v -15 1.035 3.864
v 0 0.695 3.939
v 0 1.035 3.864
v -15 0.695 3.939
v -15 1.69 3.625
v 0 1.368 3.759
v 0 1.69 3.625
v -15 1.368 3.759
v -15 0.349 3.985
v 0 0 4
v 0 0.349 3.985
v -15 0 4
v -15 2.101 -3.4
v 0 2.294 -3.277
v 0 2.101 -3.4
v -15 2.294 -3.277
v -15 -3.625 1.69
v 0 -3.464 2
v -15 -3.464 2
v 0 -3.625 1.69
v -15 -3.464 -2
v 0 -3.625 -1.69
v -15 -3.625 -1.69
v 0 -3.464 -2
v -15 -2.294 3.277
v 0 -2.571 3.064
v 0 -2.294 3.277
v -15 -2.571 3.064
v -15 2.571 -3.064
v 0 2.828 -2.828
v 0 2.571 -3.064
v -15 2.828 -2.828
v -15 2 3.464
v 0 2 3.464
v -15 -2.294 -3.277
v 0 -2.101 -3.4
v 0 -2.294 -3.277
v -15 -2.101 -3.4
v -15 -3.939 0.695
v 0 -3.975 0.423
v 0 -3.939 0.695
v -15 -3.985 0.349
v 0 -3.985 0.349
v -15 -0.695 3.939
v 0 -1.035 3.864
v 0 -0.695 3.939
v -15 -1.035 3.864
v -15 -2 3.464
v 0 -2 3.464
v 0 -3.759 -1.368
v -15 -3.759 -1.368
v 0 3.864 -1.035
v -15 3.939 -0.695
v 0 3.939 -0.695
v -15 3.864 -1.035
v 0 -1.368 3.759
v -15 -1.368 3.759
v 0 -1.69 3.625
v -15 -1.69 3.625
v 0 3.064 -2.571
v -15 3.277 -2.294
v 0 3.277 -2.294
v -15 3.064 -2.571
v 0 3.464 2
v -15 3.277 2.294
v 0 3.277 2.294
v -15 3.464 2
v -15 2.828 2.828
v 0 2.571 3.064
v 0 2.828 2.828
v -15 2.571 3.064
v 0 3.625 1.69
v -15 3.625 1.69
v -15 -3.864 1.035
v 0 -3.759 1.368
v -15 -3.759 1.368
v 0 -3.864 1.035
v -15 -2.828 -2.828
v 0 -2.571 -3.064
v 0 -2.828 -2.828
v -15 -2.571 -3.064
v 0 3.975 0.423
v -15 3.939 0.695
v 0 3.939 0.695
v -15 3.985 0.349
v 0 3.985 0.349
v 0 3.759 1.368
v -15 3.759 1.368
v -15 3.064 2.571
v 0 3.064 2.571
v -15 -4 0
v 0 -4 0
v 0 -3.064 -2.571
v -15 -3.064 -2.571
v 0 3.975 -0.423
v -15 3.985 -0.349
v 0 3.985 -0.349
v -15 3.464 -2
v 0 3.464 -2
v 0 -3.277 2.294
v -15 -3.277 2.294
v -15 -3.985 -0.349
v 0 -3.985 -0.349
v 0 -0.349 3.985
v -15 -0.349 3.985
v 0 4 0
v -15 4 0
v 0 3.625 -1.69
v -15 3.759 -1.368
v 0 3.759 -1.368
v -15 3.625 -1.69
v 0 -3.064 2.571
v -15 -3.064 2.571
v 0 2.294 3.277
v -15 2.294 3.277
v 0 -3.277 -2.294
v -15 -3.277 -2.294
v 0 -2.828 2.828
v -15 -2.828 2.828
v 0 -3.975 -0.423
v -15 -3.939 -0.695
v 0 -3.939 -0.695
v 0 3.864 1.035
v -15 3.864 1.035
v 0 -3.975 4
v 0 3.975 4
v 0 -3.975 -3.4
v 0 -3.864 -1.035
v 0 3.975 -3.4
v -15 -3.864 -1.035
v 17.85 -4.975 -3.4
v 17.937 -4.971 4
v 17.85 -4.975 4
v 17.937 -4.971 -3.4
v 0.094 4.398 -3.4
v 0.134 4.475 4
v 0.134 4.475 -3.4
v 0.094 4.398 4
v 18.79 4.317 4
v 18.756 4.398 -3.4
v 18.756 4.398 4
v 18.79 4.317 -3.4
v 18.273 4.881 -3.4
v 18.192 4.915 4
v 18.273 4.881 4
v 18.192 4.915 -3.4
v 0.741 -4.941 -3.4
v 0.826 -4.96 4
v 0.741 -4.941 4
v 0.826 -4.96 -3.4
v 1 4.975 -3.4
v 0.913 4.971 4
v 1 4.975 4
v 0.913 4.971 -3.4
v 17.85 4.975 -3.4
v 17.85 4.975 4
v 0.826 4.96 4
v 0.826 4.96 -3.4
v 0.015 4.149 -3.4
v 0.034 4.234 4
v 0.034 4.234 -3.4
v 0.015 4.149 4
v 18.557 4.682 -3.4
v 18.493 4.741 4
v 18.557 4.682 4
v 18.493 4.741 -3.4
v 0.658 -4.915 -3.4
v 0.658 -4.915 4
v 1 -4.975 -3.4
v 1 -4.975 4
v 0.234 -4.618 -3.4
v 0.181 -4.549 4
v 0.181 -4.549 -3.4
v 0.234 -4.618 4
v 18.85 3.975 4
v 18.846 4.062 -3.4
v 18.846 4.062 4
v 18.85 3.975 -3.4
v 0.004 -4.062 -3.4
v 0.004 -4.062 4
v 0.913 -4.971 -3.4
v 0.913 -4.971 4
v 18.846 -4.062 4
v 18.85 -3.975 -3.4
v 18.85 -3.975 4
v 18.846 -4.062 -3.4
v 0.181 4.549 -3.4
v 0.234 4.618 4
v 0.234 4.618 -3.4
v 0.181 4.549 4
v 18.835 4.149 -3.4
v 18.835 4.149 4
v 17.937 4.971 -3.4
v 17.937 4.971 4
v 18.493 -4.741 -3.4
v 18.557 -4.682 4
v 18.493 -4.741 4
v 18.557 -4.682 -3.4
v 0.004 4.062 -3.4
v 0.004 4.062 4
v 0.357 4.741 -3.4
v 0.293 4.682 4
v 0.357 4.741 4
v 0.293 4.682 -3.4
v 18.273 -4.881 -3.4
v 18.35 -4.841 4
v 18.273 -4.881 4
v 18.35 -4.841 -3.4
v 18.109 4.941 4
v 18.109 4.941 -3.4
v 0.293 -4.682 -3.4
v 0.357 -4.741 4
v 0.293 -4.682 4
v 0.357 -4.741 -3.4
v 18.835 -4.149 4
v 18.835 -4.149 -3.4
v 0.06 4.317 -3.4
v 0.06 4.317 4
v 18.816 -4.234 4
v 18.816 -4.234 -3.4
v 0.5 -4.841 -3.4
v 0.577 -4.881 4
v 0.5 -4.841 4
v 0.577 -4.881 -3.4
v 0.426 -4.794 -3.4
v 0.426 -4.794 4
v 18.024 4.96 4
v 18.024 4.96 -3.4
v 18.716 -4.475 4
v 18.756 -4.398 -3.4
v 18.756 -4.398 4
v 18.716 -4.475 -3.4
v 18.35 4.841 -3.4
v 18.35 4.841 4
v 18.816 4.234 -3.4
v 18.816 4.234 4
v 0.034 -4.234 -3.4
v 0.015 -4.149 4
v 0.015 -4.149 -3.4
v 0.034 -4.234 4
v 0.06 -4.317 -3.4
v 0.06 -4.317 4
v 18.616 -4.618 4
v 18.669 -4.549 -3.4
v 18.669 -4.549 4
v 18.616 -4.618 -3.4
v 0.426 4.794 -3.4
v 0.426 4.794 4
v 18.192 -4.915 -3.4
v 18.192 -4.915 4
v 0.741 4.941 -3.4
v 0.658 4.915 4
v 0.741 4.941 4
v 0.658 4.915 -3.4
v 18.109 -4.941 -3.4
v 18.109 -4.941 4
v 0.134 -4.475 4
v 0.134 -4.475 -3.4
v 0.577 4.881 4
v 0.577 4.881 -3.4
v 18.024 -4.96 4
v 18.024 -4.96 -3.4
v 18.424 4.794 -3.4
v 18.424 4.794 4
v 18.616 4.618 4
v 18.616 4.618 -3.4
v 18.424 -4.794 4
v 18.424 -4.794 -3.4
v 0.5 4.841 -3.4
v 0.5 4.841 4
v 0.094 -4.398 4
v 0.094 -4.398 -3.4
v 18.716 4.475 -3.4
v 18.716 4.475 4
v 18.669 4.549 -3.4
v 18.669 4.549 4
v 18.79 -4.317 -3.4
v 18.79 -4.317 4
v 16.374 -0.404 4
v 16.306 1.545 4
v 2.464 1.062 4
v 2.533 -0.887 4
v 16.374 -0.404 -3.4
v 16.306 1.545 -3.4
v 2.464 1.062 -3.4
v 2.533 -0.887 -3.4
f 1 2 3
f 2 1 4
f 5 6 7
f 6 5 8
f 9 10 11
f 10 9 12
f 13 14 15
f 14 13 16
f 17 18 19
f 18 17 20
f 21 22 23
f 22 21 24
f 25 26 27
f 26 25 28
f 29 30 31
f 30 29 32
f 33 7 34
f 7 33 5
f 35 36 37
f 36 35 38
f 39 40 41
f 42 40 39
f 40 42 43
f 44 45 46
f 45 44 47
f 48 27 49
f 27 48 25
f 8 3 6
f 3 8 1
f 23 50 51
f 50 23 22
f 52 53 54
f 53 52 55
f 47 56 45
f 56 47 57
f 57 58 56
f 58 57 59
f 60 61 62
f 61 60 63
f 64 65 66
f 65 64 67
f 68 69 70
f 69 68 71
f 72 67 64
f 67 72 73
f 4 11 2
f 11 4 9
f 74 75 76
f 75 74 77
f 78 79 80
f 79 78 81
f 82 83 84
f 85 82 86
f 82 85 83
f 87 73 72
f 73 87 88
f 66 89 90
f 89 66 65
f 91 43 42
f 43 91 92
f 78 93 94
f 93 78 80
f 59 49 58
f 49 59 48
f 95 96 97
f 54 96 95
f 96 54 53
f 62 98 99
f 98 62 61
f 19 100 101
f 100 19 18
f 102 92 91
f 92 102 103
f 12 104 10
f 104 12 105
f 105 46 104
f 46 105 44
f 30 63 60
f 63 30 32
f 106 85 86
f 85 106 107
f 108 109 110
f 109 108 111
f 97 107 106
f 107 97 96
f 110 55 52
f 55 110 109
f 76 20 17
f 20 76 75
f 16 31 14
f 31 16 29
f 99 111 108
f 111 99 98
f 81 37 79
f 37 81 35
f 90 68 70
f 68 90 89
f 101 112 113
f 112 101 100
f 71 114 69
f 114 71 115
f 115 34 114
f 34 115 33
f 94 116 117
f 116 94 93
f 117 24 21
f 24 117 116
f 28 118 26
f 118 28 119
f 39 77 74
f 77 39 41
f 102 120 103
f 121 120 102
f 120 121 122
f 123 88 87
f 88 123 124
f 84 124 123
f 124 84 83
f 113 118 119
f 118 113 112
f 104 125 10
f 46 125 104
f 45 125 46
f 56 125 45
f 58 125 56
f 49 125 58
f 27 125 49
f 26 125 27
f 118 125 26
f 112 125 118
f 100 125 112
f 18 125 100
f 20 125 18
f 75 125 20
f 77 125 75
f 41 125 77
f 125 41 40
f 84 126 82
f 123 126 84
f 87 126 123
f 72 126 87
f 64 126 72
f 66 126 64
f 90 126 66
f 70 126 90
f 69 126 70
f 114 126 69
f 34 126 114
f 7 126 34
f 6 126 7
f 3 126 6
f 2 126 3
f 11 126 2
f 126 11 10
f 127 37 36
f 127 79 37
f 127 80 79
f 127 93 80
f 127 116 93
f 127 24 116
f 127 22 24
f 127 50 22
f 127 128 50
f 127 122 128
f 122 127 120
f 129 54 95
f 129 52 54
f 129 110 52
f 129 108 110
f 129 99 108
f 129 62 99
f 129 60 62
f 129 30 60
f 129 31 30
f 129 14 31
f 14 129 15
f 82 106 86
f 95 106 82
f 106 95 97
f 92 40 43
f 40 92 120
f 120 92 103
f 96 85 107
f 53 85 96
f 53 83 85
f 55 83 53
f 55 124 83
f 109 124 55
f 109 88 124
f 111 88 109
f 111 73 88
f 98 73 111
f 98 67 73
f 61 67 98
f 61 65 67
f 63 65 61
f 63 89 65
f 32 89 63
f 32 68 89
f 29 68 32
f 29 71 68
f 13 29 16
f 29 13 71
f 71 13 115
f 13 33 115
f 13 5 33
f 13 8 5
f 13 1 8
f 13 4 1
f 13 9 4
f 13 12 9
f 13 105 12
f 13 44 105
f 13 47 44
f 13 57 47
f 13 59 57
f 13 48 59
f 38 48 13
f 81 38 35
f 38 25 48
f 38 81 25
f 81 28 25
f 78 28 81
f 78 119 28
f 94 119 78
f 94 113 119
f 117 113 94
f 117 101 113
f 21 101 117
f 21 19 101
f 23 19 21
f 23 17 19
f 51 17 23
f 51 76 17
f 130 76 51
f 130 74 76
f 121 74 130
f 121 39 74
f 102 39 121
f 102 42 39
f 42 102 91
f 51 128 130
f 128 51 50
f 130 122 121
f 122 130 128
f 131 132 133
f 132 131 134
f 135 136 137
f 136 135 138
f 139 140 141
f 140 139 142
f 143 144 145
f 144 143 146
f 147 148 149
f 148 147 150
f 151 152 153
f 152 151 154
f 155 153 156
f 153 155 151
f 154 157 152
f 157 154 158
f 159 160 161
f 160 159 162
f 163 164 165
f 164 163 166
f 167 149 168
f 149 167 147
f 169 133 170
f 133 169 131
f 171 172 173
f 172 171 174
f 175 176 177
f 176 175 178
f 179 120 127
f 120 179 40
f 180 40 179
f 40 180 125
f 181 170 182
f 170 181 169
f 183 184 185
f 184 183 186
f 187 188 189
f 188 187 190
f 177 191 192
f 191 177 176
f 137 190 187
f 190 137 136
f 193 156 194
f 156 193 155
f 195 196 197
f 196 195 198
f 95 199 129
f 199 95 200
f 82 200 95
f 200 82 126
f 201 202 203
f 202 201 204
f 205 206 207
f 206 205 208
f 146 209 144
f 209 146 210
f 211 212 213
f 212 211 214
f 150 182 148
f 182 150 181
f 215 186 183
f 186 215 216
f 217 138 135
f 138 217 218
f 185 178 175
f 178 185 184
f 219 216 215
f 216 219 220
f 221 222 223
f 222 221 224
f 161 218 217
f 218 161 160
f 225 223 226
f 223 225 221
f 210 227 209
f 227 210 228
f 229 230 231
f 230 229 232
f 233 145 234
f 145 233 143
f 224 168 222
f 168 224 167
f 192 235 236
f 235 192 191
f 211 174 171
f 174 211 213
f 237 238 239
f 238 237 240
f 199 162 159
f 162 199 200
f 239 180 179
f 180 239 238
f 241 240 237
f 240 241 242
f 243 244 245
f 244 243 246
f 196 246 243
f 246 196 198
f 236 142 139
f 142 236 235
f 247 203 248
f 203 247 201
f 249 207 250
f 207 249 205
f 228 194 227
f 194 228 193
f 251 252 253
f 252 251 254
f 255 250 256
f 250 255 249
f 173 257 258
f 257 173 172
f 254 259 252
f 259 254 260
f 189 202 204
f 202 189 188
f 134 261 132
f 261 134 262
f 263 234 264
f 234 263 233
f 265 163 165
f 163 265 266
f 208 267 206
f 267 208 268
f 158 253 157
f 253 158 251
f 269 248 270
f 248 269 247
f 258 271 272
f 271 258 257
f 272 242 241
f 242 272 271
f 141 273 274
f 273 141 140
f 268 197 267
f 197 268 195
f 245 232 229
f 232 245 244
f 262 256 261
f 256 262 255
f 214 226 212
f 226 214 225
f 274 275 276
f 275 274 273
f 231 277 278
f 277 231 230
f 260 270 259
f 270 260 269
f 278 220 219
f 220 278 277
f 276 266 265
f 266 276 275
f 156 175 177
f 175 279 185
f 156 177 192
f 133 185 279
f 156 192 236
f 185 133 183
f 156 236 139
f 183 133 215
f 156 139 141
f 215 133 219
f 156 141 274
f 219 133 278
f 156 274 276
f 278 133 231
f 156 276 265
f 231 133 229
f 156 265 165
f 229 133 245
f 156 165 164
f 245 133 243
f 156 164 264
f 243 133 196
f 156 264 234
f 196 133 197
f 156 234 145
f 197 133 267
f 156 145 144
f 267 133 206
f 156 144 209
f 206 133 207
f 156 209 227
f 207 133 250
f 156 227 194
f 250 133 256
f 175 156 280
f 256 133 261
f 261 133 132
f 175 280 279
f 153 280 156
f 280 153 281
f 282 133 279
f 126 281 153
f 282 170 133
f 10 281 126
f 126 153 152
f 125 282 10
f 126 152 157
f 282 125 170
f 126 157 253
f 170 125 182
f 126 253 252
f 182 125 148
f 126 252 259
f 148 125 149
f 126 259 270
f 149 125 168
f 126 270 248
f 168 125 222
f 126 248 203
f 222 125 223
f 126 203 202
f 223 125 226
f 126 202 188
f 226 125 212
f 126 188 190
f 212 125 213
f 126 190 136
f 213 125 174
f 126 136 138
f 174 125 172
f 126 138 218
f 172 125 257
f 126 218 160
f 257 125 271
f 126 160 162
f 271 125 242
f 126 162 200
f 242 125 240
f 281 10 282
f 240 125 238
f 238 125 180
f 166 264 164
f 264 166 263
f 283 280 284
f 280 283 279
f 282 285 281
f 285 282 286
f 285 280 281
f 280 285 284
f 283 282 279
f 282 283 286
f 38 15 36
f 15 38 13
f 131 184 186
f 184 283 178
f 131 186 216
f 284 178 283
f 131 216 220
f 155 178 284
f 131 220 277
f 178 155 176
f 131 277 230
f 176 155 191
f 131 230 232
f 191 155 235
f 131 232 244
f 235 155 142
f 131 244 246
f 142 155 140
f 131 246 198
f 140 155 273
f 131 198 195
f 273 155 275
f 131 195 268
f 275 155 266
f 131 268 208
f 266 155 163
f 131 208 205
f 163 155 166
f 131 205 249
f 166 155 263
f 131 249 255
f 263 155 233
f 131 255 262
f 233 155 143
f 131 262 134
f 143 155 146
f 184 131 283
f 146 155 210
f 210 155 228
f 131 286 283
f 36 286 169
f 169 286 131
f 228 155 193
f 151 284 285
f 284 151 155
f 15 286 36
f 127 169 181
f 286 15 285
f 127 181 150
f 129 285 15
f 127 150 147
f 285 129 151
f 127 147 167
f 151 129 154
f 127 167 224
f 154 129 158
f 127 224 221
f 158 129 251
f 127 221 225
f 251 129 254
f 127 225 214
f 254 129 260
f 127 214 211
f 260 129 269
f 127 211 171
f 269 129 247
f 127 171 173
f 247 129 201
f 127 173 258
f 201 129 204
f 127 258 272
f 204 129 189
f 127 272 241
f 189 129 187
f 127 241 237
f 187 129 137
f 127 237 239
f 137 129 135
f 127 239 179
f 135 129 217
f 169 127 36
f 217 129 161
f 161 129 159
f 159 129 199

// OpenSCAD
Gap = 0.2;
$fn = 72;

BarMount();

module BarMount() {
    RodThickness = 1.75 + Gap;
    RodDepth = 13.85; // Measured 13.10, but let's keep it a bit wider
    
    BearingDiameter = 8.0;
    BearingLength = 15;
    
    ConnectorShift = 0.3;
    
    ConnectorWidth = RodThickness+8;
    ConnectorDepth = RodDepth+5;
    
    CornerRadius = 1;
    
    intersection() {
        translate([0,0,ConnectorShift])
            cube([200,200,BearingDiameter - 2 * ConnectorShift], center=true);
        difference() {
            union () {
                rotate([0,-90,0])
                    cylinder(r = BearingDiameter/2, h = BearingLength);
                
                rotate([0,-90,0])
                    cylinder(r = BearingDiameter/2,
                             h = 5);
                
                linear_extrude(height=BearingDiameter, center=true)
                    offset(r=CornerRadius)
                        polygon([[CornerRadius, -ConnectorWidth/2 + CornerRadius],
                                 [ConnectorDepth - CornerRadius,
                                  -ConnectorWidth/2 + CornerRadius],
                                 [ConnectorDepth - CornerRadius,
                                  ConnectorWidth/2 - CornerRadius],
                                 [CornerRadius,
                                  ConnectorWidth/2 - CornerRadius]]);
            }
            
            rotate([0,0,2])
                union () {
                    translate([ConnectorDepth/2,0,0])
                        cube([RodDepth, RodThickness, 100], center = true);
            }
        }
    }    
}
